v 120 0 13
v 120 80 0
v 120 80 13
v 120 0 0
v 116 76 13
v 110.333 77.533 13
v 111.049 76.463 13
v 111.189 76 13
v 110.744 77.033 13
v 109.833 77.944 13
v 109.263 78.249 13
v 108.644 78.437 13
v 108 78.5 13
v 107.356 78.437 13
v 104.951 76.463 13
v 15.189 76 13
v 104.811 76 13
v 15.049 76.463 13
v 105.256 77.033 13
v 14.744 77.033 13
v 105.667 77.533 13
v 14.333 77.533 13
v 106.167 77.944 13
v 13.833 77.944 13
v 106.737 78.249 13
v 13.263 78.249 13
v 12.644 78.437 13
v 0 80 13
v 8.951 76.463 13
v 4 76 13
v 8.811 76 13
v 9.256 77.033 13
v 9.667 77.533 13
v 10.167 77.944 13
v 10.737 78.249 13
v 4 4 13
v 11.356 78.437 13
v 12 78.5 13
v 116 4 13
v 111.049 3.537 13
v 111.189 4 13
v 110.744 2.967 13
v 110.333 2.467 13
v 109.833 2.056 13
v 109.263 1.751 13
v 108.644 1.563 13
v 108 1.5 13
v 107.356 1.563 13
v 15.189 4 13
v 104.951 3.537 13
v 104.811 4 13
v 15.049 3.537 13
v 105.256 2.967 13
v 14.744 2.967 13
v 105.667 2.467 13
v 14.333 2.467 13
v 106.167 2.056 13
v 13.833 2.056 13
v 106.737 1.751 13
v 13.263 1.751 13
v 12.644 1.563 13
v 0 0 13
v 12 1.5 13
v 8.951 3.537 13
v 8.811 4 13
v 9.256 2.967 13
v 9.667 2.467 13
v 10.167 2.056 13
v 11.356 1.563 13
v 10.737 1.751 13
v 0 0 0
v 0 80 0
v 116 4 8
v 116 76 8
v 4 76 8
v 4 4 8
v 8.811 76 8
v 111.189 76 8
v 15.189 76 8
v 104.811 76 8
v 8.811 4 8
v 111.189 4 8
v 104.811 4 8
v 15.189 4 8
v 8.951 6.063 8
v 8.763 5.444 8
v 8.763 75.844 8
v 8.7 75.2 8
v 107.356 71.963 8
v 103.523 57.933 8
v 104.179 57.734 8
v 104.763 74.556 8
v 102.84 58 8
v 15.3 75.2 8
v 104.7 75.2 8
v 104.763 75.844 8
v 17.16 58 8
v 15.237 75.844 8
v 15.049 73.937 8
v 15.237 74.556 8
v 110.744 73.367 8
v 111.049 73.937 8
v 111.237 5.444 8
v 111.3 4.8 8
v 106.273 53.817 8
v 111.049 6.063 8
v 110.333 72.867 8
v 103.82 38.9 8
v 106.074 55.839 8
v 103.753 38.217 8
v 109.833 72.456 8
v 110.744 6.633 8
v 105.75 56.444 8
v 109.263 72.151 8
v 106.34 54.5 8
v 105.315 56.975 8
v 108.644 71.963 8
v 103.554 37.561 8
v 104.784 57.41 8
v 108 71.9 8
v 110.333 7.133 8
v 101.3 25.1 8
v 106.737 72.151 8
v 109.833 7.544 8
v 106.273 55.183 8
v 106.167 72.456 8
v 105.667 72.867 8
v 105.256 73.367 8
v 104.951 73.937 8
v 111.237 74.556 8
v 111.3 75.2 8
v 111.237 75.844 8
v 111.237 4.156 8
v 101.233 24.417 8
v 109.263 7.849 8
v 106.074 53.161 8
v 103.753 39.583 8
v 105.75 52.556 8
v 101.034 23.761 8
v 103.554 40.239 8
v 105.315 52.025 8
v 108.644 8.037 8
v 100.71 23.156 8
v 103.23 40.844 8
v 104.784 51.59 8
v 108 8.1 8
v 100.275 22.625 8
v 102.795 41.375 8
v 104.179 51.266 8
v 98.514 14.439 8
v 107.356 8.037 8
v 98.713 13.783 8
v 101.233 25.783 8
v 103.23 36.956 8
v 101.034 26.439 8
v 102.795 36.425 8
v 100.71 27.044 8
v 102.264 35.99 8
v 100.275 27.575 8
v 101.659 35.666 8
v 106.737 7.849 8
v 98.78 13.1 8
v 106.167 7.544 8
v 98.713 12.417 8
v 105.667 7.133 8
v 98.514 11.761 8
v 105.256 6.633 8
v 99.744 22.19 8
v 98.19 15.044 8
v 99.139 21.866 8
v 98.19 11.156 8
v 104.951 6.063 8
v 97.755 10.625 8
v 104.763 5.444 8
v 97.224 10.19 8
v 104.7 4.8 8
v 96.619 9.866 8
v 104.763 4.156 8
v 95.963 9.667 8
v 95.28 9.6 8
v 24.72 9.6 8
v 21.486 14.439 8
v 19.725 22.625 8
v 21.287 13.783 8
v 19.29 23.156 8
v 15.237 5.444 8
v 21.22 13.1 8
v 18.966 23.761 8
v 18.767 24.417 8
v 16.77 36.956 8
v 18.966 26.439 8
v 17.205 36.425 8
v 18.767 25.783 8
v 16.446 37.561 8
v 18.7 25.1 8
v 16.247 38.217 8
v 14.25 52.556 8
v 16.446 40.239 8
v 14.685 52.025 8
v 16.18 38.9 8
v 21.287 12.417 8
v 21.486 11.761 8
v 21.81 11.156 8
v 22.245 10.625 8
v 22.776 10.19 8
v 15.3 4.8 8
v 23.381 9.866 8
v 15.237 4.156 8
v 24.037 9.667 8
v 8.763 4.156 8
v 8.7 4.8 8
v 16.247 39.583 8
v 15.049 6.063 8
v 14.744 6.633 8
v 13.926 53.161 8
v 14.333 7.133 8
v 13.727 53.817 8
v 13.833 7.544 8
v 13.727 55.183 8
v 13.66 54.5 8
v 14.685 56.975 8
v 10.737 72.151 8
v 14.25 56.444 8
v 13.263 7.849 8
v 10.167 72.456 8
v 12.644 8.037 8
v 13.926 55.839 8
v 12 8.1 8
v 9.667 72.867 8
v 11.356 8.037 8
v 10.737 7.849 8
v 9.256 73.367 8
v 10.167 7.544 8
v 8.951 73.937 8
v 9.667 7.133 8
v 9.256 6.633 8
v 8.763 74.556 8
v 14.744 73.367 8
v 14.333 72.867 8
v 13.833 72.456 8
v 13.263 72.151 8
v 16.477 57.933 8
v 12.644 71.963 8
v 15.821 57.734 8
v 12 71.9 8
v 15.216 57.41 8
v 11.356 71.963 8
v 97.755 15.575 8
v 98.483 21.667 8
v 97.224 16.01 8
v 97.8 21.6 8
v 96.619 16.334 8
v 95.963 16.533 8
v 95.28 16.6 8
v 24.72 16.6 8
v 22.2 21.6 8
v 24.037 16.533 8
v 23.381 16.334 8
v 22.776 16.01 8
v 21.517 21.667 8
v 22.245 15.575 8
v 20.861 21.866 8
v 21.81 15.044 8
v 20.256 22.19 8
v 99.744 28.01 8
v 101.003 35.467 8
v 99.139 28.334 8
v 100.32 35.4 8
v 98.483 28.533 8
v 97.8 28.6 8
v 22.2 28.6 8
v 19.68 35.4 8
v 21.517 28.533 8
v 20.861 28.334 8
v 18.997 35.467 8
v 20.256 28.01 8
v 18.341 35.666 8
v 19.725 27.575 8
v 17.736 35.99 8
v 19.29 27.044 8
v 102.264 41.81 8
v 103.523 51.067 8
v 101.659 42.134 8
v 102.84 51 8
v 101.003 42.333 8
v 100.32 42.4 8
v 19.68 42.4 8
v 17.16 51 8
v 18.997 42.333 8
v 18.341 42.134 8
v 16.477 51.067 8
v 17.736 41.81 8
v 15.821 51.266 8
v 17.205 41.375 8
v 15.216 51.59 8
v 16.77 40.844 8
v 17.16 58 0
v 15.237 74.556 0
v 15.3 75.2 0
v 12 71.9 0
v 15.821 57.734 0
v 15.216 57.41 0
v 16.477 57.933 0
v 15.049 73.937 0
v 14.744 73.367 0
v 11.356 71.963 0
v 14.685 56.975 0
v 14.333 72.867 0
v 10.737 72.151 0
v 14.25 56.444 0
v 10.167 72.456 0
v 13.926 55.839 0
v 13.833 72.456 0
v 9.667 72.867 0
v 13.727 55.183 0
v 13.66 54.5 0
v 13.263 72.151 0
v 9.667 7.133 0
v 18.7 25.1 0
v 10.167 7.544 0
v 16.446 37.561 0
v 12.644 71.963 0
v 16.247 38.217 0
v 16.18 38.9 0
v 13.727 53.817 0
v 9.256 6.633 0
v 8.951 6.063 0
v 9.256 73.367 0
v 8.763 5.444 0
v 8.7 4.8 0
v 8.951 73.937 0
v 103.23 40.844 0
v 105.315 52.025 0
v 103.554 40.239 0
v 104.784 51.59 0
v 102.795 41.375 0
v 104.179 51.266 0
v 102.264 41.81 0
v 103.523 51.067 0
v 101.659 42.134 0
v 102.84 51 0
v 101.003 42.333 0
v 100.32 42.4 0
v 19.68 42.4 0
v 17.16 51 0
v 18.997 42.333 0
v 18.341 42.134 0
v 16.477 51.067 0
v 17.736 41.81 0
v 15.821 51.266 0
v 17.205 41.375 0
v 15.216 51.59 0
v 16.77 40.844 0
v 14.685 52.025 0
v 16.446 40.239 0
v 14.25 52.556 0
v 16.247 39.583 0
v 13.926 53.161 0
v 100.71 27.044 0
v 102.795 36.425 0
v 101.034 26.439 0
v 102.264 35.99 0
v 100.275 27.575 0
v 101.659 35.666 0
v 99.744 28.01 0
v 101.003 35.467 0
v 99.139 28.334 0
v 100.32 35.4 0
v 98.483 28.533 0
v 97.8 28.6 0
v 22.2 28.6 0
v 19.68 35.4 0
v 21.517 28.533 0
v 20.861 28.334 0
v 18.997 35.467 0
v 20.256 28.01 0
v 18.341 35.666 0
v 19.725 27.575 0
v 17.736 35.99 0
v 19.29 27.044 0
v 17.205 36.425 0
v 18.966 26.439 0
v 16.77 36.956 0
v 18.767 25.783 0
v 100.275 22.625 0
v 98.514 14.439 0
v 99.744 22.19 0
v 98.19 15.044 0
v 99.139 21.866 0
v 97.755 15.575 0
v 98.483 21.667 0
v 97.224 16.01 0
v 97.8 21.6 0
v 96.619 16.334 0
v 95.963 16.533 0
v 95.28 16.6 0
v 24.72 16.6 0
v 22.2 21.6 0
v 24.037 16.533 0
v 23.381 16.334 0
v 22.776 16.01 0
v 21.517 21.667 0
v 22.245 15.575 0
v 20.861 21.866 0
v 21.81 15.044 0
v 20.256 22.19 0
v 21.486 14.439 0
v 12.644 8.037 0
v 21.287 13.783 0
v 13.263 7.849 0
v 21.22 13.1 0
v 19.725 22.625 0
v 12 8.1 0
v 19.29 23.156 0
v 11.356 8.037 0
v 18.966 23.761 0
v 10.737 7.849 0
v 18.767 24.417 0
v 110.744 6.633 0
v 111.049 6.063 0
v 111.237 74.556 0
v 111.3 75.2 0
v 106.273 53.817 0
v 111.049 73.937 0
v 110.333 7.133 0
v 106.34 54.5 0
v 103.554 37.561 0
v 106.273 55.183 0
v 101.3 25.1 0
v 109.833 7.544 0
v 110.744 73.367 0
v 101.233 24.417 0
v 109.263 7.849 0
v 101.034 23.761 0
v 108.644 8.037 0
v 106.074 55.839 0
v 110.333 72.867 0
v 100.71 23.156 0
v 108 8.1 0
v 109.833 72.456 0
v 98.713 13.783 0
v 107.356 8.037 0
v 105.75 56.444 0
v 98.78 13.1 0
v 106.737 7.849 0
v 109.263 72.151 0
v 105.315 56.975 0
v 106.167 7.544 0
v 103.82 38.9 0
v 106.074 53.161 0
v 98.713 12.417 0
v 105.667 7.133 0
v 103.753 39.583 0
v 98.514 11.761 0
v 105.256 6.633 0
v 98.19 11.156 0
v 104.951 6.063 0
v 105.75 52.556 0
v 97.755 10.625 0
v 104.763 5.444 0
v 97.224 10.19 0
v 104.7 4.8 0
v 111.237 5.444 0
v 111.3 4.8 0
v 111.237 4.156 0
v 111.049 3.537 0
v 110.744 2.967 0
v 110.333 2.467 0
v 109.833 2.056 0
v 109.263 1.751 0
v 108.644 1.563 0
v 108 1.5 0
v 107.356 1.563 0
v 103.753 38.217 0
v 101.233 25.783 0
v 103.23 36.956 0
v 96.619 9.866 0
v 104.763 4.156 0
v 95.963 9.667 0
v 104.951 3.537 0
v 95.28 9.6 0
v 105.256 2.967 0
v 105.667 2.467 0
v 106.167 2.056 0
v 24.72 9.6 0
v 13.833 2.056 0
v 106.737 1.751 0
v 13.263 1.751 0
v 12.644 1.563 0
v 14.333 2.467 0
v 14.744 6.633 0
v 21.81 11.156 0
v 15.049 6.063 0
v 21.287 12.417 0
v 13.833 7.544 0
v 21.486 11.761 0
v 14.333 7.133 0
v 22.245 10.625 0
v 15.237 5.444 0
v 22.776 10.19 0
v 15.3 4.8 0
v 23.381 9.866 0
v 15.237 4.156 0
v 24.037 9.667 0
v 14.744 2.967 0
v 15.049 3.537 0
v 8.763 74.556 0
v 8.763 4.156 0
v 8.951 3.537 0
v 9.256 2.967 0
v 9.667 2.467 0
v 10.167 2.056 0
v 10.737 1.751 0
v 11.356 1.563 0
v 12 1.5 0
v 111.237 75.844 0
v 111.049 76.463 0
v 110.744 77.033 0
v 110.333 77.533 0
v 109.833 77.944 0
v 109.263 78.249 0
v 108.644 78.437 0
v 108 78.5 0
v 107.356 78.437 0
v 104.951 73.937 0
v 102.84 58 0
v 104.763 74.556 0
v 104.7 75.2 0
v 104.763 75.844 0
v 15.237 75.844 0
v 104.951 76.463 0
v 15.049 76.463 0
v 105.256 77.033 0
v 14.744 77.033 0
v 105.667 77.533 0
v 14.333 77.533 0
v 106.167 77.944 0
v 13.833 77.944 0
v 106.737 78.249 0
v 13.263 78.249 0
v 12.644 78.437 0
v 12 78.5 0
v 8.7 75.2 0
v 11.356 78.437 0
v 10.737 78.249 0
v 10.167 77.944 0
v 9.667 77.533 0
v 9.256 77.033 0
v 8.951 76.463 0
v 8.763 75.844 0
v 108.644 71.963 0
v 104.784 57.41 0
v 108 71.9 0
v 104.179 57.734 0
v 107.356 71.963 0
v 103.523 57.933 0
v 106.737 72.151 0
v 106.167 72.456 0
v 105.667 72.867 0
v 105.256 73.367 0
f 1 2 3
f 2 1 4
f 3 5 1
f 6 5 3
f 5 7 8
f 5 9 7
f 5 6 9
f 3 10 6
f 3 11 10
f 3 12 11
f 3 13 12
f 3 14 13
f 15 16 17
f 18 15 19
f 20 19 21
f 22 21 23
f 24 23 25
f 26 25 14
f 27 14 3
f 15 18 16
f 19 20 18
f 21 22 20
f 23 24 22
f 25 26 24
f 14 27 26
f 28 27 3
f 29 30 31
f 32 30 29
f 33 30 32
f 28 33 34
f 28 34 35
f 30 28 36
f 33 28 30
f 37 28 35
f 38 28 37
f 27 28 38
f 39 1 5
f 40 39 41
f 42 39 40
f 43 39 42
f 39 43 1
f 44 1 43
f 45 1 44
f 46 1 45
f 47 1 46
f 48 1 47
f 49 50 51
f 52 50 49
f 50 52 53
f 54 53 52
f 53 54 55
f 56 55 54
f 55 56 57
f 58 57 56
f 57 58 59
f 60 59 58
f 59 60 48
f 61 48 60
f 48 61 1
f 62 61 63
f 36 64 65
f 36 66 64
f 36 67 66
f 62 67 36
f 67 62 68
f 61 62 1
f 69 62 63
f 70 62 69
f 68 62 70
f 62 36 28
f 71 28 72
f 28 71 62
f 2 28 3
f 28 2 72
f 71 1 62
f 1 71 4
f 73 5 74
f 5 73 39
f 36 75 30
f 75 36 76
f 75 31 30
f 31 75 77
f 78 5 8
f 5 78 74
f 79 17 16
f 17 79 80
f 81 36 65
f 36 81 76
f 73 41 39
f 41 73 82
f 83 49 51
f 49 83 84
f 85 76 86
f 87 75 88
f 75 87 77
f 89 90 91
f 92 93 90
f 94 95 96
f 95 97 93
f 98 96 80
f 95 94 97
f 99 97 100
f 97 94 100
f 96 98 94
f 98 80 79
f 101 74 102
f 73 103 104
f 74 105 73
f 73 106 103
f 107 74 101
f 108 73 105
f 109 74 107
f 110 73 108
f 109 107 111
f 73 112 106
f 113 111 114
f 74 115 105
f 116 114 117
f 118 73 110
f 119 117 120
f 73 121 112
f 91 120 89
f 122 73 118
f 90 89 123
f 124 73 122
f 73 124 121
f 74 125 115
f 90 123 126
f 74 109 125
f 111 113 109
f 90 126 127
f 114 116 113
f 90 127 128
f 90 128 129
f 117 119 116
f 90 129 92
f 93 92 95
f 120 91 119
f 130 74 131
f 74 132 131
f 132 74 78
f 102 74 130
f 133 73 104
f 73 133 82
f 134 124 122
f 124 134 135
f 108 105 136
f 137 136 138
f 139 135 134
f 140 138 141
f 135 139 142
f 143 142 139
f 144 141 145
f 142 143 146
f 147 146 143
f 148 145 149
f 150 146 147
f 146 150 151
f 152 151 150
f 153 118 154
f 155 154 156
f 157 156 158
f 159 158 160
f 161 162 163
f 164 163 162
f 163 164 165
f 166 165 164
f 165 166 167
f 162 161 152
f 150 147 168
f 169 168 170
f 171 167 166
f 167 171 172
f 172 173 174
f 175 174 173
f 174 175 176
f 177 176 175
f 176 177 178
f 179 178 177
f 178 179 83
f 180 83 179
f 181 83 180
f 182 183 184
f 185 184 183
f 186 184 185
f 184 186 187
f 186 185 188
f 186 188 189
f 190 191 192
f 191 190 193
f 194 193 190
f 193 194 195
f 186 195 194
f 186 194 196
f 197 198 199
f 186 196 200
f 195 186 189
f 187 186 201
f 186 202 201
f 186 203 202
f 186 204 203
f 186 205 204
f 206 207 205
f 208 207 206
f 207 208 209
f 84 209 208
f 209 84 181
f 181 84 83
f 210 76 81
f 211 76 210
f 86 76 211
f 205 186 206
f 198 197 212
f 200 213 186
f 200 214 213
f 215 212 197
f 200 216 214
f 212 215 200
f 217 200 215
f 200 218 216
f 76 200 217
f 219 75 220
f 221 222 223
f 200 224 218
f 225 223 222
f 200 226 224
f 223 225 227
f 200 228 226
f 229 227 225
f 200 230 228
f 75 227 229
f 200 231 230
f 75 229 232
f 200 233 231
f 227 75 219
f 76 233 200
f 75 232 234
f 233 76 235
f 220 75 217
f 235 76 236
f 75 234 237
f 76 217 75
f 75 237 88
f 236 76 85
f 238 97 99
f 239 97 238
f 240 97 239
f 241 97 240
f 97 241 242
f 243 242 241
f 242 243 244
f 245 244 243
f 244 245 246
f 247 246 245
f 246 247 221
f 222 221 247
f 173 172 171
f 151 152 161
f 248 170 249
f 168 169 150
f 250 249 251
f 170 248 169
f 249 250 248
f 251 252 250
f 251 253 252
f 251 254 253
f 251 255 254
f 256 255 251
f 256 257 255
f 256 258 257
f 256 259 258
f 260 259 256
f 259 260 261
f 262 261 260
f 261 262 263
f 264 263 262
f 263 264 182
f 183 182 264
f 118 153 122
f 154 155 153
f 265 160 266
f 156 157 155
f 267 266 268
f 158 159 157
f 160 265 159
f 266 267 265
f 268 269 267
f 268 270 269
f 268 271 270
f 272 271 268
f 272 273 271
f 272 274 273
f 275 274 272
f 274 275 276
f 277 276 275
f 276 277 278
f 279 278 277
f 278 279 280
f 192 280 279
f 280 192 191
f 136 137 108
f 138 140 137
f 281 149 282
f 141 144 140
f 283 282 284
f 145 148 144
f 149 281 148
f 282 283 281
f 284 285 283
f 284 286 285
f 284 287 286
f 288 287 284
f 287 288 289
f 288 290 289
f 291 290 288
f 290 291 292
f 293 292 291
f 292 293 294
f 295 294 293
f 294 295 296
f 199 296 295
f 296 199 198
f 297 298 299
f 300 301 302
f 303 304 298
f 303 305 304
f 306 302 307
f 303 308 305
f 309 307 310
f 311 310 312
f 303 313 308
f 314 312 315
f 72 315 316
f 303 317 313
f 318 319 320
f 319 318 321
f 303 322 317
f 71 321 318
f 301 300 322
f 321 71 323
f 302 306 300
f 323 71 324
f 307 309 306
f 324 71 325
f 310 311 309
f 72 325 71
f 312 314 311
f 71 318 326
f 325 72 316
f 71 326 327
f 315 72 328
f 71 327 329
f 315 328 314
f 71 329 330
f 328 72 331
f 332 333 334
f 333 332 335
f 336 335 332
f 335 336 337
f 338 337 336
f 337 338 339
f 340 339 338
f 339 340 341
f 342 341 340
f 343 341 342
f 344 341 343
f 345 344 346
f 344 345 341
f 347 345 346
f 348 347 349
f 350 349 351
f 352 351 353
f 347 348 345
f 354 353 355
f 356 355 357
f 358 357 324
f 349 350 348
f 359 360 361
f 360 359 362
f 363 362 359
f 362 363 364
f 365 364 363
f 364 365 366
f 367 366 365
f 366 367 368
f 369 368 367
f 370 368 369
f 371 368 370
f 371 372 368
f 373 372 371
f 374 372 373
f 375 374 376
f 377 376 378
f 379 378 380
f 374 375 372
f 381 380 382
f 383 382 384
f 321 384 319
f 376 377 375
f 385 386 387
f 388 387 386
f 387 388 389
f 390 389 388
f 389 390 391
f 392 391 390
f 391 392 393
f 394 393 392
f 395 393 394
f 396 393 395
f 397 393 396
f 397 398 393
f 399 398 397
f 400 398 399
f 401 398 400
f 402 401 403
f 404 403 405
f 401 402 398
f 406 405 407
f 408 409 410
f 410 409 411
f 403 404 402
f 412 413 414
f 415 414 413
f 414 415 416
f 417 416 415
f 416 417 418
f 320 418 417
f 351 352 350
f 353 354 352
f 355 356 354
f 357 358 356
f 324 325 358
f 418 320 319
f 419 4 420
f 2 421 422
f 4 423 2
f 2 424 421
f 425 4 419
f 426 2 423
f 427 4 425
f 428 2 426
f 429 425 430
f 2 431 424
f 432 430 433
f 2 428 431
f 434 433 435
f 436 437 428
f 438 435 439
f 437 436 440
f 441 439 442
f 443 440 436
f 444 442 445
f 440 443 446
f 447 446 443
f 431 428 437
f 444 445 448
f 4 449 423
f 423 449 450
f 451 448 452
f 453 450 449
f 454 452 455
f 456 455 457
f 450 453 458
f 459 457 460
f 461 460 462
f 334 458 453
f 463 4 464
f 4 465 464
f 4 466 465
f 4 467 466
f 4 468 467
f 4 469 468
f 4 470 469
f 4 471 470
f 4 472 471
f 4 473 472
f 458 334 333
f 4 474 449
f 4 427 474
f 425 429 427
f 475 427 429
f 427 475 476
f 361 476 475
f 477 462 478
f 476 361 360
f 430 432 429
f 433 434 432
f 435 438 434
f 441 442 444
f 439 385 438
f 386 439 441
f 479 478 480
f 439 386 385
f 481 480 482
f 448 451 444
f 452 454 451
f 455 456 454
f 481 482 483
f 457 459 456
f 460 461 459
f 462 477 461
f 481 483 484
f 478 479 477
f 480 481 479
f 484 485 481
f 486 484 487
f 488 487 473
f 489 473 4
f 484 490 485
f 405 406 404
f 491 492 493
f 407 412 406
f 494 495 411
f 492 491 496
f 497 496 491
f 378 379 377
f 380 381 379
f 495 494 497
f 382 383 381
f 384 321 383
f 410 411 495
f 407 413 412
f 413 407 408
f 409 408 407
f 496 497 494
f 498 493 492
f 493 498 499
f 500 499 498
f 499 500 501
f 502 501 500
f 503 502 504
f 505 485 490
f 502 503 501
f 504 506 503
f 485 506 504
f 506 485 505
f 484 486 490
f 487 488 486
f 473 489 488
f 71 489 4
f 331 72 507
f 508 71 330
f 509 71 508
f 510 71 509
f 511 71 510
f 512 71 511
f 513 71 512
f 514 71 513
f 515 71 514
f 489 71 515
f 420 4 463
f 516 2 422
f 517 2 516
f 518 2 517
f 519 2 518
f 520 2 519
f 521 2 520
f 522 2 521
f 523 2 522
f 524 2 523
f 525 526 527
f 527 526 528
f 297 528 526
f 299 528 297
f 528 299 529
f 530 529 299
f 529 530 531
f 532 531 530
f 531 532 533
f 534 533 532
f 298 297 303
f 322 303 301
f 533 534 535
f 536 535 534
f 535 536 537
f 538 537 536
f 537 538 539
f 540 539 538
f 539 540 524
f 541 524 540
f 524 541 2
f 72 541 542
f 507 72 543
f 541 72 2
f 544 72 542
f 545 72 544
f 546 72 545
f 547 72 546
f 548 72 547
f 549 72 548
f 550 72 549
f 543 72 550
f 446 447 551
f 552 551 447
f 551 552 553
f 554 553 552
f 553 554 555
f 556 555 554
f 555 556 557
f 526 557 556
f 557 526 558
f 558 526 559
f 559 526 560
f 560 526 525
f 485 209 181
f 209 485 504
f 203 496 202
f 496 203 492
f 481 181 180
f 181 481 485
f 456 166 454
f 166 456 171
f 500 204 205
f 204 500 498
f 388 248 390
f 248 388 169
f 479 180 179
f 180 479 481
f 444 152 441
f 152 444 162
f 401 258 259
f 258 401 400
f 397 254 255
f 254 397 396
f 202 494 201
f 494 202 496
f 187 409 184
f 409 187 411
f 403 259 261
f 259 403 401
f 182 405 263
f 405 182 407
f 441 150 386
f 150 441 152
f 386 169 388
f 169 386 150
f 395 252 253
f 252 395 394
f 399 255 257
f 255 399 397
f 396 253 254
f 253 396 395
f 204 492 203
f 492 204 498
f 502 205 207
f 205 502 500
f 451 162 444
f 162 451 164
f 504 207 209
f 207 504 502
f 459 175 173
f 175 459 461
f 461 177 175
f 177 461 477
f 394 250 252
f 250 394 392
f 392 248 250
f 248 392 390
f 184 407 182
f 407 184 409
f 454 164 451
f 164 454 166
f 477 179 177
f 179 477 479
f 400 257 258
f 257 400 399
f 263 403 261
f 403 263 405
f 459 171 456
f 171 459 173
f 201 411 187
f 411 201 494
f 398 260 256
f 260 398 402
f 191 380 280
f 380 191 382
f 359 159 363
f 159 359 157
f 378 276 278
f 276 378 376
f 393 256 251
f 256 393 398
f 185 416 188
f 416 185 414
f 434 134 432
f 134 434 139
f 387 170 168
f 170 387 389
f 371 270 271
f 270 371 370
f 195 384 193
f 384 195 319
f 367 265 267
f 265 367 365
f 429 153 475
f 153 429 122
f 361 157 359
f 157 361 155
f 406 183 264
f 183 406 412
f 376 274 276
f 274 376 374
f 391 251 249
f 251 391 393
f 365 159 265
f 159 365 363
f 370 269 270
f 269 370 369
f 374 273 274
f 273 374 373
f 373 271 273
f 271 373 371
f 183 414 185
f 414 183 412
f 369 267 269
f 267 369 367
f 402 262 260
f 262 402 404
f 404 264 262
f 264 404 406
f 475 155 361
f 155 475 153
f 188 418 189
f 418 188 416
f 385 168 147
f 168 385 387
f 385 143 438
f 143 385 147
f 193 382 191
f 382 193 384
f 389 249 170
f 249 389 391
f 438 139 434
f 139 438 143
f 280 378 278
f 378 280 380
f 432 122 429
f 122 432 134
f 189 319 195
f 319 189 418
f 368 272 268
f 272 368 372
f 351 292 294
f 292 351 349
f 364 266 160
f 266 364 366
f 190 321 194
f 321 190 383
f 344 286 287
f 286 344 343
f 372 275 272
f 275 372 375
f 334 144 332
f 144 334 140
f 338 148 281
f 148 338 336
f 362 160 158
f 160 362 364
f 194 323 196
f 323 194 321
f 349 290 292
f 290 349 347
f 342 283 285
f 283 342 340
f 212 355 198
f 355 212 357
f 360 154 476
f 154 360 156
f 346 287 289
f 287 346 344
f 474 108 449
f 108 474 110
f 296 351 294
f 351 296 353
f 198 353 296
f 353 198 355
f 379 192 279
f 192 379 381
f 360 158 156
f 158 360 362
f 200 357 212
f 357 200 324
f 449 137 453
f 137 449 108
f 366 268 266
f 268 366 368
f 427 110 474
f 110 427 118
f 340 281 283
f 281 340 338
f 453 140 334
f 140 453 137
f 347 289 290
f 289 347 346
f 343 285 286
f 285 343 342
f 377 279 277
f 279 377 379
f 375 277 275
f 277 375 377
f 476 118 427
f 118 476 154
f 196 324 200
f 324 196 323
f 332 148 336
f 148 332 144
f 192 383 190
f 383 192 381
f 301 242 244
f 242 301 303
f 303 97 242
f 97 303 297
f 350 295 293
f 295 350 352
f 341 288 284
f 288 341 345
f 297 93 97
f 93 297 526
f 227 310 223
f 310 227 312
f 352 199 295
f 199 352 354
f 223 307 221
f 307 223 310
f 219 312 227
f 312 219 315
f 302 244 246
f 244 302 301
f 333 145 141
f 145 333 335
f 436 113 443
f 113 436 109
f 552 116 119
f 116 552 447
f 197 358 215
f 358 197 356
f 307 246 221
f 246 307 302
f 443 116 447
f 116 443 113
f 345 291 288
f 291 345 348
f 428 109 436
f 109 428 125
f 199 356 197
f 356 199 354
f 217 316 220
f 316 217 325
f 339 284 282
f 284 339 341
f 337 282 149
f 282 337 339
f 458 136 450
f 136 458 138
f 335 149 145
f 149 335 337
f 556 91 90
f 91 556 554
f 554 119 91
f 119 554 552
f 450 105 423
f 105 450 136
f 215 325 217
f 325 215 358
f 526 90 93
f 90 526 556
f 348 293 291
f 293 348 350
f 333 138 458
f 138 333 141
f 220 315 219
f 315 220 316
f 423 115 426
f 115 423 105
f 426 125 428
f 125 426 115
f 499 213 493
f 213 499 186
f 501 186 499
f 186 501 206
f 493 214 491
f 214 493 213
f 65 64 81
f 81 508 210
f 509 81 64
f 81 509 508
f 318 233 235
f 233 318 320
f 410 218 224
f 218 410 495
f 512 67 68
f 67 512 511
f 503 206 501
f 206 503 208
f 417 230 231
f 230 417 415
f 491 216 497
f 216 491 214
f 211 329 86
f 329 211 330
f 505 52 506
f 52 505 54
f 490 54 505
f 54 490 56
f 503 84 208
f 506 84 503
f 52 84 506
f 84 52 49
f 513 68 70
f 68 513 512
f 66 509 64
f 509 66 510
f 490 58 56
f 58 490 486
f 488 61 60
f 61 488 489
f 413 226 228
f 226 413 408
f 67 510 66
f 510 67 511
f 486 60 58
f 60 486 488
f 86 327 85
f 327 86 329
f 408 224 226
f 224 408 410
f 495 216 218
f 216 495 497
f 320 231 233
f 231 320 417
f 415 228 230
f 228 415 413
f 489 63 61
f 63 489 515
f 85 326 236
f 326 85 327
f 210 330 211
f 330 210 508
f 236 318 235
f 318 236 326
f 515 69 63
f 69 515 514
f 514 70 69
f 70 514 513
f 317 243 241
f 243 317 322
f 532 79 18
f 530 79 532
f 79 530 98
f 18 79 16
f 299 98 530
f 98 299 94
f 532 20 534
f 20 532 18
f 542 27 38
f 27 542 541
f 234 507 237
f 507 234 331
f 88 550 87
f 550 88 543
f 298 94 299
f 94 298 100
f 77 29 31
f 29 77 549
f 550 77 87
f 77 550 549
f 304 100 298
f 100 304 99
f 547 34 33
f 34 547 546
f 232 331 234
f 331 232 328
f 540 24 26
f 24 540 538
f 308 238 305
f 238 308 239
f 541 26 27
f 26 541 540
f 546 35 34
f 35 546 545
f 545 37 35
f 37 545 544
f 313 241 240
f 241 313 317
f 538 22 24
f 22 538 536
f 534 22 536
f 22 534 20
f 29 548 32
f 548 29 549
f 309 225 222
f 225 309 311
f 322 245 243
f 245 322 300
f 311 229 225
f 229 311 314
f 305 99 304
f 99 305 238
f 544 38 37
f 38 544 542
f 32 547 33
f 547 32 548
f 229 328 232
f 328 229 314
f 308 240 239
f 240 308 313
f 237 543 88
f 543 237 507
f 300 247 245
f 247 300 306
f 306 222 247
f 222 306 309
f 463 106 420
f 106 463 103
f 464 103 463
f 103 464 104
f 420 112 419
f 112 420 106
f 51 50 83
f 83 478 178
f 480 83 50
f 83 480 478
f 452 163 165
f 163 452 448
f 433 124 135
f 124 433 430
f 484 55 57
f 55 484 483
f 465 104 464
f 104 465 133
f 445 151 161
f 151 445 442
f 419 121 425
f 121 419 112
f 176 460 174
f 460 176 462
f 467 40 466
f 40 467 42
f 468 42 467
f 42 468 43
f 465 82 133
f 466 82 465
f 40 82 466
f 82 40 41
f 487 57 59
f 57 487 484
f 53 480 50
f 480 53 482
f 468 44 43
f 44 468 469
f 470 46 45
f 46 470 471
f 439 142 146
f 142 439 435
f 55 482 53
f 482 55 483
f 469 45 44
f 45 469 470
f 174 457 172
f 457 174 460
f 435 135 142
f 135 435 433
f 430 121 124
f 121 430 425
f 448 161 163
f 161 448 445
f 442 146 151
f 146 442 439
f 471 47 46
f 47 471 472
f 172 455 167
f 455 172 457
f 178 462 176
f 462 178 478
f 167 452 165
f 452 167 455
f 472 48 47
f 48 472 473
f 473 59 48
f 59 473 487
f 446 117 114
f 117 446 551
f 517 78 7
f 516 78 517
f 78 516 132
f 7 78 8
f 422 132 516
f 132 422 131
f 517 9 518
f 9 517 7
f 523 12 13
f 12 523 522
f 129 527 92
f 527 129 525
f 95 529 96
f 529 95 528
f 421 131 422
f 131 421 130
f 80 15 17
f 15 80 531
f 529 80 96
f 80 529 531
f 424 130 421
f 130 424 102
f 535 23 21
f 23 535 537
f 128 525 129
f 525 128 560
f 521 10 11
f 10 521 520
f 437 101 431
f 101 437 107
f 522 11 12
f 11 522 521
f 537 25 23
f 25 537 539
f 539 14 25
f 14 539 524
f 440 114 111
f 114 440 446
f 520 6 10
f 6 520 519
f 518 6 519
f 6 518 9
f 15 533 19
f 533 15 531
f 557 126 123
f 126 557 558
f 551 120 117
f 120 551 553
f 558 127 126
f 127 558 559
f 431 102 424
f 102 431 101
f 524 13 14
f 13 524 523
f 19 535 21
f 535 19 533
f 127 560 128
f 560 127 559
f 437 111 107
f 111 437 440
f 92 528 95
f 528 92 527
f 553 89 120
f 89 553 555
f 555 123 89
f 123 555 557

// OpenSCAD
$fn = 32;

// ----------------------------------------------------------------------
// Slotted panel: 120 x 80 mm, 4 ряда of slots
// ----------------------------------------------------------------------

// --- parameters (mm) ---
panel_w = 120;            // panel width
panel_d = 80;             // panel depth
thick = 8;                // panel thickness
slot_w = 7;               // slot width
pitch0 = 12;              // first row pitch
pitch_step = 1.8;         // pitch increase per row
margin = 9.6;             // margin around the slot field
rows = 4;                 // number of slot rows
mount_d = 6.6;            // mounting holes
mount_x = 48;             // mounting hole offset
rim_h = 13;               // rim height
rim_t = 4;                // rim wall thickness

difference() {
  union() {
    cube([panel_w, panel_d, thick]);
    translate([0, 0, thick - 1]) difference() {
      cube([panel_w, panel_d, rim_h - thick + 1]);
      translate([rim_t, rim_t, -2.5]) cube([panel_w - 2 * rim_t, panel_d - 2 * rim_t, rim_h - thick + 6]);
    }
  }
  /* slot rows: stadium shaped cutters, 2.5 mm clear of both faces */
  /* row 0: pitch 12, length 70.56 */
  hull() {
    translate([24.72, 13.1, -2.5]) cylinder(h = thick + 5, d = slot_w);
    translate([95.28, 13.1, -2.5]) cylinder(h = thick + 5, d = slot_w);
  }
  /* row 1: pitch 13.8, length 75.6 */
  hull() {
    translate([22.2, 25.1, -2.5]) cylinder(h = thick + 5, d = slot_w);
    translate([97.8, 25.1, -2.5]) cylinder(h = thick + 5, d = slot_w);
  }
  /* row 2: pitch 15.6, length 80.64 */
  hull() {
    translate([19.68, 38.9, -2.5]) cylinder(h = thick + 5, d = slot_w);
    translate([100.32, 38.9, -2.5]) cylinder(h = thick + 5, d = slot_w);
  }
  /* row 3: pitch 17.4, length 85.68 */
  hull() {
    translate([17.16, 54.5, -2.5]) cylinder(h = thick + 5, d = slot_w);
    translate([102.84, 54.5, -2.5]) cylinder(h = thick + 5, d = slot_w);
  }
  translate([12, 4.8, -2.5]) cylinder(h = 18, d = mount_d);
  translate([12, 75.2, -2.5]) cylinder(h = 18, d = mount_d);
  translate([108, 4.8, -2.5]) cylinder(h = 18, d = mount_d);
  translate([108, 75.2, -2.5]) cylinder(h = 18, d = mount_d);
}
